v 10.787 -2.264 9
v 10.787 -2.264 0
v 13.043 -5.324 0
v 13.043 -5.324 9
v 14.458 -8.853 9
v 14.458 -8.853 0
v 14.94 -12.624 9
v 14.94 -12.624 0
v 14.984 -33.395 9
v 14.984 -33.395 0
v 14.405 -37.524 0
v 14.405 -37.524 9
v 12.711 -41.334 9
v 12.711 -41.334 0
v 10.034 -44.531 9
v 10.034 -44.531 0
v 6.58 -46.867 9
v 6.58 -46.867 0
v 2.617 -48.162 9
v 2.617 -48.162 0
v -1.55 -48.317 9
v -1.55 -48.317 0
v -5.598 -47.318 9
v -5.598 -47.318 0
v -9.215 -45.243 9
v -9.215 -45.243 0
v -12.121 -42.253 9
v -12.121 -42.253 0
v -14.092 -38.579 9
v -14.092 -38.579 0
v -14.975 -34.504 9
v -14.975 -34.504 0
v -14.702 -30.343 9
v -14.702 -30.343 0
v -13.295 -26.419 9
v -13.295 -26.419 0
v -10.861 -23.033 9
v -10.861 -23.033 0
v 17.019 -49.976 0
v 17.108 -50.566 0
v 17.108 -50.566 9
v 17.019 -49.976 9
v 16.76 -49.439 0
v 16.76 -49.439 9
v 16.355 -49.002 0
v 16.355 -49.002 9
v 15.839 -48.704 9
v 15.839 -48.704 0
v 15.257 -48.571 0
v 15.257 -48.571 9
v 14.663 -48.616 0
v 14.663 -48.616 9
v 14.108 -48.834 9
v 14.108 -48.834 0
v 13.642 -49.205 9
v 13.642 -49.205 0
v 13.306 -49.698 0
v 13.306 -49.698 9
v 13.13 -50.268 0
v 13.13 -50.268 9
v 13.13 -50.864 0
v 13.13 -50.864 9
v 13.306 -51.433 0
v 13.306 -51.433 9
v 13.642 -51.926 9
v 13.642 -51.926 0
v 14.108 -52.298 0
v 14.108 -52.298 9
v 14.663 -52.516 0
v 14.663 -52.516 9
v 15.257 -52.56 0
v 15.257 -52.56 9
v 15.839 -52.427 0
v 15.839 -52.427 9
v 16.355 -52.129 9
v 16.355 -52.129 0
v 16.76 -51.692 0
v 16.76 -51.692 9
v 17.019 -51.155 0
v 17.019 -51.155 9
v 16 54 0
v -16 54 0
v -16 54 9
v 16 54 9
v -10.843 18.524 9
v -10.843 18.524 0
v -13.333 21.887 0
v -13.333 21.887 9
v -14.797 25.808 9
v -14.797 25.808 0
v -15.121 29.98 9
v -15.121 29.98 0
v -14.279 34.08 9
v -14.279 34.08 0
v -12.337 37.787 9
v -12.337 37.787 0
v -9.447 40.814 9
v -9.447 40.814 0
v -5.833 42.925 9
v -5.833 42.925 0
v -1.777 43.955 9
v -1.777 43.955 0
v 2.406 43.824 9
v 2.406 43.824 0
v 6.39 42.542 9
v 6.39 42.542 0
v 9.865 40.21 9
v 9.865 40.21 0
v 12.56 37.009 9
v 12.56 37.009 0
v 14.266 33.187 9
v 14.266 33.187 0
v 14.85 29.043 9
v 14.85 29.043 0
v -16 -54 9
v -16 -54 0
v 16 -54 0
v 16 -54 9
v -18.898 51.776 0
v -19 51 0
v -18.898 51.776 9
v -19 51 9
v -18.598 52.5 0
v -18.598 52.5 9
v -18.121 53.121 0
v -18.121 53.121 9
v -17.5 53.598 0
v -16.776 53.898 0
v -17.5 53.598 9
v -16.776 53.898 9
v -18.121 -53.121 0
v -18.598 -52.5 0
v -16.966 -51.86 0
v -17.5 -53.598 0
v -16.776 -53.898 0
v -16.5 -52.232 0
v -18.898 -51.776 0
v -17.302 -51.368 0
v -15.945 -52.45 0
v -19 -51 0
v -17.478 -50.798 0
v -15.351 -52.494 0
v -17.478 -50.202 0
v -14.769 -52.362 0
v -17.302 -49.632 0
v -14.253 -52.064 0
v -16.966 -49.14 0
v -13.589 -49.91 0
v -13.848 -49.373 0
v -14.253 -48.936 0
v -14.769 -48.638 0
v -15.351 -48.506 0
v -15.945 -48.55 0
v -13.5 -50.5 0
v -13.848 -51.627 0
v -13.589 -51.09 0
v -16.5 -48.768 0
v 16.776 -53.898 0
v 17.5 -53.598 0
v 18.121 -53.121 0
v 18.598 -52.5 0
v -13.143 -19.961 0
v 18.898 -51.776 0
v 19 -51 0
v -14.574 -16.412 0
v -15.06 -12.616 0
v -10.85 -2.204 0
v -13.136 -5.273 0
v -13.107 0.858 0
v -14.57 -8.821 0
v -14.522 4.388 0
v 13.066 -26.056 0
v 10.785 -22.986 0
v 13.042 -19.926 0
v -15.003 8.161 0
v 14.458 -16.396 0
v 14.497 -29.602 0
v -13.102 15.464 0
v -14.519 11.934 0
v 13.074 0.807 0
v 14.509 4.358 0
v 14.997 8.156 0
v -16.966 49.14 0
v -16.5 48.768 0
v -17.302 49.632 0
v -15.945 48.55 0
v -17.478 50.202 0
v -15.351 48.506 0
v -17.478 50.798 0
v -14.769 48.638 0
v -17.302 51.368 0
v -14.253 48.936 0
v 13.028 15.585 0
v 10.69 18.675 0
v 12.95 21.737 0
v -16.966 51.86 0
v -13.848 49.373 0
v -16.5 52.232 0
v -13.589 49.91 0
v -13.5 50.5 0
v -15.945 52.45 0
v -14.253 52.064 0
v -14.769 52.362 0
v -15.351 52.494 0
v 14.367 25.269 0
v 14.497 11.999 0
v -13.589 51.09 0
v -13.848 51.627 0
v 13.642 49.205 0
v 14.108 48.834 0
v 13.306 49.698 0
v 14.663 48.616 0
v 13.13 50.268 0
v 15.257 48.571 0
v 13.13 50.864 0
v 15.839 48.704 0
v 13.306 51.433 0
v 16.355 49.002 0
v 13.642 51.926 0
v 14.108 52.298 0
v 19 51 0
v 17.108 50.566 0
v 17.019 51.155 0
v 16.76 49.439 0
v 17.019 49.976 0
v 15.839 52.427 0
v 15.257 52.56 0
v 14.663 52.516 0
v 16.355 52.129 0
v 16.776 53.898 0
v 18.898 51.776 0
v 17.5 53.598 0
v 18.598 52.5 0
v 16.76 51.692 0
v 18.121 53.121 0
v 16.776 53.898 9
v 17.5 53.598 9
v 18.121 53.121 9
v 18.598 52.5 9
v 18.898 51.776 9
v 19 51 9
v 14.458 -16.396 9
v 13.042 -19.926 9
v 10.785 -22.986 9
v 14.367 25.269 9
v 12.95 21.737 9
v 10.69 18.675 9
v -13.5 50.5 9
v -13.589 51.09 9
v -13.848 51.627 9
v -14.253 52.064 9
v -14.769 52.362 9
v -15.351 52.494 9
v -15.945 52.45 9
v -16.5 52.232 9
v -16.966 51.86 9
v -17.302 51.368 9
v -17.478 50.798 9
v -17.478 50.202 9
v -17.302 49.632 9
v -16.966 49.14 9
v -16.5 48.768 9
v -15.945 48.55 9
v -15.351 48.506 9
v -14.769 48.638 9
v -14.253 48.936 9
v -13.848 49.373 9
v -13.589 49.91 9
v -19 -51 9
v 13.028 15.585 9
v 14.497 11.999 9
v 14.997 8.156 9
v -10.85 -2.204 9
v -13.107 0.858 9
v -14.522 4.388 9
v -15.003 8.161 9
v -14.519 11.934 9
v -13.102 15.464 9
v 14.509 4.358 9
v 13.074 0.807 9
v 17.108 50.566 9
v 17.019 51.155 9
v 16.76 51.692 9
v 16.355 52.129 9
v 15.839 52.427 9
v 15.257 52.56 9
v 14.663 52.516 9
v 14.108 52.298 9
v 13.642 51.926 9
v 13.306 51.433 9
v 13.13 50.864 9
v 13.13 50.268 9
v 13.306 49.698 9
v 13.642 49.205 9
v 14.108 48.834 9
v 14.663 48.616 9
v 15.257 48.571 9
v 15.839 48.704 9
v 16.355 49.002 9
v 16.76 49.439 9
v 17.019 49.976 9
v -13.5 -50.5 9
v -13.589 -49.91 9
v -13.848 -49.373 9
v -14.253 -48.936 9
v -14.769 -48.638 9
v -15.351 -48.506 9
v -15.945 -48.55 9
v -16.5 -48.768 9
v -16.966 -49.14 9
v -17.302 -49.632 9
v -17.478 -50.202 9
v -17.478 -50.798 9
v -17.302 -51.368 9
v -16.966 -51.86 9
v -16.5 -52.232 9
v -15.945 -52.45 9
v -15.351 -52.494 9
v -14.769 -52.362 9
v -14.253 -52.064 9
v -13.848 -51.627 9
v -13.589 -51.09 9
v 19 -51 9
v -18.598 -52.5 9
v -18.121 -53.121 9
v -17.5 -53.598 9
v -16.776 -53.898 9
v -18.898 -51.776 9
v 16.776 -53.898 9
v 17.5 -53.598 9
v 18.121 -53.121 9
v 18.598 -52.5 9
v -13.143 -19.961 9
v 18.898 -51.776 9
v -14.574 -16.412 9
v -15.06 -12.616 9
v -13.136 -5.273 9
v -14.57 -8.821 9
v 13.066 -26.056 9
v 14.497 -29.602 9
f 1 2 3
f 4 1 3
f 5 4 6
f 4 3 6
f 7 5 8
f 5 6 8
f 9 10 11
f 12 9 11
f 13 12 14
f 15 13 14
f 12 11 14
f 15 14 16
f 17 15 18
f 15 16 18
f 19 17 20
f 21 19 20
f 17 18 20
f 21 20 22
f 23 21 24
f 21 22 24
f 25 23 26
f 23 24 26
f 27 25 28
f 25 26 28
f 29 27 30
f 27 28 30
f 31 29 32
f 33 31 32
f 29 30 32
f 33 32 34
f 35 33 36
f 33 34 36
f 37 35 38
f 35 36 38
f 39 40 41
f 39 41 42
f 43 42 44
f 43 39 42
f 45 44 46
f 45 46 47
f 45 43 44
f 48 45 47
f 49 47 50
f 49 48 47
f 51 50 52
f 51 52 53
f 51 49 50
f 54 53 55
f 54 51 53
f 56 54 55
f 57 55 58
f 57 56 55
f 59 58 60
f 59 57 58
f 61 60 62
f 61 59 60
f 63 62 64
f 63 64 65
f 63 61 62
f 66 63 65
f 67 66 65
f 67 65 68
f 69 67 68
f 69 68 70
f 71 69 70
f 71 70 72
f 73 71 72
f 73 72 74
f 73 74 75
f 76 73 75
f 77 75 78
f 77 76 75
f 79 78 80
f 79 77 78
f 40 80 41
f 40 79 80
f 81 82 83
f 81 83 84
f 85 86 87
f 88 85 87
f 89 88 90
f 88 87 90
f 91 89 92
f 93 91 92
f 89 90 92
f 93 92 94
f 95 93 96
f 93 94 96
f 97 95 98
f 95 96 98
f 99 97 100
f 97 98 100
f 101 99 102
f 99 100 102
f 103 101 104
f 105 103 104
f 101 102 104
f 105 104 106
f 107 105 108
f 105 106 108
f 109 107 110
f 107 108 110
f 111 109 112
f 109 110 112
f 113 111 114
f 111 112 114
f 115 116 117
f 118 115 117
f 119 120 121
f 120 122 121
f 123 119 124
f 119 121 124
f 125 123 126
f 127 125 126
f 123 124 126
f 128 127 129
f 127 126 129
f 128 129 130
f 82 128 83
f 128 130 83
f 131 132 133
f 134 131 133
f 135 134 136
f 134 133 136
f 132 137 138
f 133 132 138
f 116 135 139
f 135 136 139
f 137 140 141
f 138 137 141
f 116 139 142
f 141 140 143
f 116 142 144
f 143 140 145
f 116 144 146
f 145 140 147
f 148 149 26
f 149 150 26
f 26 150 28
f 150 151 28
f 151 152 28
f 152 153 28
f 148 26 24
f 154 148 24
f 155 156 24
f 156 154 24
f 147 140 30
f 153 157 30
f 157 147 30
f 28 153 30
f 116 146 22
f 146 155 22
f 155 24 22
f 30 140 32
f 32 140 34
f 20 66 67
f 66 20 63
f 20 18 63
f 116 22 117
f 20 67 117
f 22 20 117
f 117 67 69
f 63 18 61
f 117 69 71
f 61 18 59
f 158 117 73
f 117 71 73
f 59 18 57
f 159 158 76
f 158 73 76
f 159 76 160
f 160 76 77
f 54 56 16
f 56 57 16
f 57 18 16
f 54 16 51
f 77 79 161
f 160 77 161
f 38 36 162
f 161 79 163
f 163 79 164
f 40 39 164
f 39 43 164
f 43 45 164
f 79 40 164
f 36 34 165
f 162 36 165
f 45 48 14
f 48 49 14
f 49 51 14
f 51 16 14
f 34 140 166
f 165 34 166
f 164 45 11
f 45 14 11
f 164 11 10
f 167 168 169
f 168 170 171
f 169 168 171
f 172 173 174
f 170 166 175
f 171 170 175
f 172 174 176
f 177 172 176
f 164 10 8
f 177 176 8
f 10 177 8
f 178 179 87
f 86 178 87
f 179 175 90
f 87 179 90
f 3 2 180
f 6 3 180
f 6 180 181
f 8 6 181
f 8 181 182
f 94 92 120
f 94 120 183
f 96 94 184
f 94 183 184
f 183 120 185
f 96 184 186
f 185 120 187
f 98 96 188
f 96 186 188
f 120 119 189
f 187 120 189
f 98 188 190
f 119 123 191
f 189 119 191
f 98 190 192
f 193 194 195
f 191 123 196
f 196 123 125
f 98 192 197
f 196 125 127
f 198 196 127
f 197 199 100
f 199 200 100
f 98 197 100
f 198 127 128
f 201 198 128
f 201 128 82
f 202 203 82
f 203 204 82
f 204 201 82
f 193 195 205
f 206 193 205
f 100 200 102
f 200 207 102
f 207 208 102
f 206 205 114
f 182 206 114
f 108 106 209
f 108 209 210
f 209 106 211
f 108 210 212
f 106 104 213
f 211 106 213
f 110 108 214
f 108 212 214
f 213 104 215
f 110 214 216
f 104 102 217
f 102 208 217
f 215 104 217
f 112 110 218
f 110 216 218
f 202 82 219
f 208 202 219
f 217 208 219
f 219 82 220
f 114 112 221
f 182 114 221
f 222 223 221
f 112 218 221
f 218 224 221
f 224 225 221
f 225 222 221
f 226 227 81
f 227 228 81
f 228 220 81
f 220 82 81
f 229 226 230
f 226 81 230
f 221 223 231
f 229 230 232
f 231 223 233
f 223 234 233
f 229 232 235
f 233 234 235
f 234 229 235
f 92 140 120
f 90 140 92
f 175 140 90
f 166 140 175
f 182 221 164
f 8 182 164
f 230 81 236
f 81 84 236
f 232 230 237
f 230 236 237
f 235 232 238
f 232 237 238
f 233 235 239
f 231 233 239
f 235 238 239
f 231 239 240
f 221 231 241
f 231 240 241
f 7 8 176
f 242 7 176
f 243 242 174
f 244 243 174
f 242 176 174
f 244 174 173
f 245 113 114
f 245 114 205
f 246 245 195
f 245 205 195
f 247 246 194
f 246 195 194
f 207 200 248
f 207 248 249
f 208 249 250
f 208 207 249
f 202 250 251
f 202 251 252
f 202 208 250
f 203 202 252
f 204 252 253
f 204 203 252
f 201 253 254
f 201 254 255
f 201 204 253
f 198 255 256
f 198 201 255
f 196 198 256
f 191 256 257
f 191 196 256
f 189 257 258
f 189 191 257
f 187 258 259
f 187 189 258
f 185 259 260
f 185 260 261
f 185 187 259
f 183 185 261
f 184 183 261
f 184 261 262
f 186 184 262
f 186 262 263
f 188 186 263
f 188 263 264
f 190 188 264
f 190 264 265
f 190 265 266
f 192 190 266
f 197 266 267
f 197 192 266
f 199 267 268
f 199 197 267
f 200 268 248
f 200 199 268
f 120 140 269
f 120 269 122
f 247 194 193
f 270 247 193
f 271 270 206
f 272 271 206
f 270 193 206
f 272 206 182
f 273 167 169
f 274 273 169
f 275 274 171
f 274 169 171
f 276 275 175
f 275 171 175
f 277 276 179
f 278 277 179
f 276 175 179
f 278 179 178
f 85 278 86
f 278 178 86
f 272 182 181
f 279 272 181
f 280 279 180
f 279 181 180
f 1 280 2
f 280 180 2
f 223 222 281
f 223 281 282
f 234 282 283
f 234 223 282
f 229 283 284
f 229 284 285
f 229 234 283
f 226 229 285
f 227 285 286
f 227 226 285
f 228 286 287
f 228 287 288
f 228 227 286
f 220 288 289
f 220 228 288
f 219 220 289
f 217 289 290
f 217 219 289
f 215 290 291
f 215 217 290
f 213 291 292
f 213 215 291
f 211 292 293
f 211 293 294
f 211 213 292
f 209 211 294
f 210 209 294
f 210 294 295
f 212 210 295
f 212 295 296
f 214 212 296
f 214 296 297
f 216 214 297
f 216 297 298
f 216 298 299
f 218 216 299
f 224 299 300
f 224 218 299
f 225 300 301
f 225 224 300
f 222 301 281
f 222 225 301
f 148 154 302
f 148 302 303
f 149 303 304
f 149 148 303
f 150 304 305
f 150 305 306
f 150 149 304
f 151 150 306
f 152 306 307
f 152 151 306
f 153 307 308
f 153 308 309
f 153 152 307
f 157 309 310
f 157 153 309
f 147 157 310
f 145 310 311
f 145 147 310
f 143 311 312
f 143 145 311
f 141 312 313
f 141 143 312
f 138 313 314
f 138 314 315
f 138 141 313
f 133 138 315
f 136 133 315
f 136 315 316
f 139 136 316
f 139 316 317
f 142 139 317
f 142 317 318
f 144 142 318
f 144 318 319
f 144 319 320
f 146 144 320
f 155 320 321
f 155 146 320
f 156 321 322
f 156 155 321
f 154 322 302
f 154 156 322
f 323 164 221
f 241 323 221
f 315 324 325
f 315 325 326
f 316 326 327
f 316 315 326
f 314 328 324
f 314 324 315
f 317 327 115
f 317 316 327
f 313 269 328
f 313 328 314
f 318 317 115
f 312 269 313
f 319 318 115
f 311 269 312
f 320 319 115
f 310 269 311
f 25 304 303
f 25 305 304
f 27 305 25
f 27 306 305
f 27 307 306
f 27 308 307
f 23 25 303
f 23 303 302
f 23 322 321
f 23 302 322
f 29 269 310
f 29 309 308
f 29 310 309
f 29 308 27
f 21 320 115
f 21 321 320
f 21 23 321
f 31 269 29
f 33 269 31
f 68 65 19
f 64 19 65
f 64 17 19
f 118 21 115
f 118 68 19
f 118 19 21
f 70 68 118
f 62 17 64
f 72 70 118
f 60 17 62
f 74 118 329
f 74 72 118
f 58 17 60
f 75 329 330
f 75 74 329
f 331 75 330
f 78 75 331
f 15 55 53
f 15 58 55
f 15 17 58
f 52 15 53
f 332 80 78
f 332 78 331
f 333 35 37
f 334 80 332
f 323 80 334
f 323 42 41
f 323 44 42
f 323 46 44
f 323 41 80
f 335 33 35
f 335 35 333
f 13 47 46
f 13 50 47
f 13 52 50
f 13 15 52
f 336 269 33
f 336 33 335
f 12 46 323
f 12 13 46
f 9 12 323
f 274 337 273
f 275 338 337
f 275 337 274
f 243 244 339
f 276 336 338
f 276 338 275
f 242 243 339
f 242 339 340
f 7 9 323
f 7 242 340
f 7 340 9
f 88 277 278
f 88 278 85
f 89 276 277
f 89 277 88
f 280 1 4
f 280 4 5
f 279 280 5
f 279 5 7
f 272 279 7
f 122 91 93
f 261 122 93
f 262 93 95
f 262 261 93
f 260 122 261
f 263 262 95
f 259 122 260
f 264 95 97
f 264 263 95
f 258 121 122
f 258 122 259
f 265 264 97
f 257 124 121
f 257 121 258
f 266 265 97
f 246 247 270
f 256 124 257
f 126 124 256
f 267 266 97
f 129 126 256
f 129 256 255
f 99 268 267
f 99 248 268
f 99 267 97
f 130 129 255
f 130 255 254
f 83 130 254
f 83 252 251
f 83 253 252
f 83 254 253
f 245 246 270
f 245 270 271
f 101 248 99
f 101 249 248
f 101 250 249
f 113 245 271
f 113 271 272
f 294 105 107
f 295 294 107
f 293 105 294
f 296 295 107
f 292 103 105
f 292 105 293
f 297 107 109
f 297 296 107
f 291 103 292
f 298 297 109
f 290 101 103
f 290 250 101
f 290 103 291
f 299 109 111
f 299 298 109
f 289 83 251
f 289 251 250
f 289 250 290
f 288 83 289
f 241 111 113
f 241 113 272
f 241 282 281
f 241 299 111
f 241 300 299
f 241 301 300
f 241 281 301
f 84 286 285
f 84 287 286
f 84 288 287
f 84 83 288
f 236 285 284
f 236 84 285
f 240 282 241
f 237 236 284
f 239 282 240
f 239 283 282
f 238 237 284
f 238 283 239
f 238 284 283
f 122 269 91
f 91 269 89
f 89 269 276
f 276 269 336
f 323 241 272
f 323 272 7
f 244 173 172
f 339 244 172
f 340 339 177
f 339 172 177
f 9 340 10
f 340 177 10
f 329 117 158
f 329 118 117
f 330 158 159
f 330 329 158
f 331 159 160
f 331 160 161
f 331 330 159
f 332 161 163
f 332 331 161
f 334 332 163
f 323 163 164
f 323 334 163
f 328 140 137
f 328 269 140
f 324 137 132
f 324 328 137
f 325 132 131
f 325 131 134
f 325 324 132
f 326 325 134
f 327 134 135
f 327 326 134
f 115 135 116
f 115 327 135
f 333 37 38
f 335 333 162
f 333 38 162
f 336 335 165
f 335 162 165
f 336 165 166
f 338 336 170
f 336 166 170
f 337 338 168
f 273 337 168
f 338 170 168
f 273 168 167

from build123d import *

# Parameters (mm, degrees)
F0_W     = 38
F0_H     = 108
F0_R     = 2
F1_DEPTH = 9
F2_R     = 3


with BuildPart() as f1:
    # F0 (on Top) → F1 (new body)
    with BuildSketch(Plane.XY):
        with BuildLine():
            ThreePointArc((5.706968, -5.714822), (7.712615, -8.087528), (8.791989, -11.000826))
            ThreePointArc((8.791989, -11.000826), (11.232354, -10.554221), (12.600096, -12.624032))
            ThreePointArc((12.600096, -12.624032), (11.232354, -14.693844), (8.791989, -14.247239))
            ThreePointArc((8.791989, -14.247239), (7.713498, -17.159023), (5.709659, -19.530996))
            ThreePointArc((5.709659, -19.530996), (8.425965, -20.996255), (10.784891, -22.986424))
            ThreePointArc((10.784891, -22.986424), (13.862215, -18.206159), (14.939576, -12.624032))
            ThreePointArc((14.939576, -12.624032), (13.862843, -7.043472), (10.787222, -2.264082))
            ThreePointArc((10.787222, -2.264082), (8.425588, -4.252233), (5.706968, -5.714822))
        make_face()
        with BuildLine():
            ThreePointArc((-8.919726, -11.038862), (-7.830592, -8.082615), (-5.789315, -5.682866))
            ThreePointArc((-5.789315, -5.682866), (-8.499762, -4.205185), (-10.850307, -2.203935))
            ThreePointArc((-10.850307, -2.203935), (-15.060422, -12.616237), (-10.861132, -23.032909))
            ThreePointArc((-10.861132, -23.032909), (-8.510775, -21.032627), (-5.800788, -19.555715))
            ThreePointArc((-5.800788, -19.555715), (-7.814796, -17.19237), (-8.905782, -14.285245))
            ThreePointArc((-8.905782, -14.285245), (-12.720827, -12.678409), (-8.919726, -11.038862))
        make_face()
        with BuildLine():
            ThreePointArc((5.603682, 1.265457), (8.381963, -0.225399), (10.787222, -2.264082))
            ThreePointArc((10.787222, -2.264082), (13.905039, 2.536774), (14.997339, 8.156016))
            ThreePointArc((14.997339, 8.156016), (13.878906, 13.839509), (10.690392, 18.675455))
            ThreePointArc((10.690392, 18.675455), (8.324534, 16.666348), (5.595827, 15.187174))
            ThreePointArc((5.595827, 15.187174), (7.57988, 12.907076), (8.697198, 10.09871))
            ThreePointArc((8.697198, 10.09871), (11.379114, 10.5015), (12.850096, 8.223097))
            ThreePointArc((12.850096, 8.223097), (11.379114, 5.944693), (8.697198, 6.347483))
            ThreePointArc((8.697198, 6.347483), (7.582521, 3.543455), (5.603682, 1.265457))
        make_face()
        with BuildLine():
            ThreePointArc((-10.842957, 18.523657), (-15.00266, 8.161334), (-10.850307, -2.203935))
            ThreePointArc((-10.850307, -2.203935), (-8.49497, -0.220064), (-5.784132, 1.241002))
            ThreePointArc((-5.784132, 1.241002), (-7.772737, 3.510479), (-8.899446, 6.309695))
            ThreePointArc((-8.899446, 6.309695), (-13.060362, 8.167454), (-8.915558, 10.060887))
            ThreePointArc((-8.915558, 10.060887), (-7.810312, 12.874025), (-5.83607, 15.162624))
            ThreePointArc((-5.83607, 15.162624), (-8.510157, 16.588935), (-10.842957, 18.523657))
        make_face()
        Rectangle(F0_W, F0_H)
        with Locations((-15.5, -50.5)):
            Circle(F0_R, mode=Mode.SUBTRACT)
        with BuildLine():
            ThreePointArc((14.997339, 8.156016), (13.905039, 2.536774), (10.787222, -2.264082))
            ThreePointArc((10.787222, -2.264082), (13.862843, -7.043472), (14.939576, -12.624032))
            ThreePointArc((14.939576, -12.624032), (13.862215, -18.206159), (10.784891, -22.986424))
            ThreePointArc((10.784891, -22.986424), (13.894801, -27.783287), (14.984183, -33.3953))
            ThreePointArc((14.984183, -33.3953), (-5.597944, -47.317938), (-10.861132, -23.032909))
            ThreePointArc((-10.861132, -23.032909), (-15.060422, -12.616237), (-10.850307, -2.203935))
            ThreePointArc((-10.850307, -2.203935), (-15.00266, 8.161334), (-10.842957, 18.523657))
            ThreePointArc((-10.842957, 18.523657), (-5.833397, 42.924664), (14.850096, 29.043097))
            ThreePointArc((14.850096, 29.043097), (13.771383, 23.457599), (10.690392, 18.675455))
            ThreePointArc((10.690392, 18.675455), (13.878906, 13.839509), (14.997339, 8.156016))
        make_face(mode=Mode.SUBTRACT)
        with Locations((15.107894, -50.56573)):
            Circle(F0_R, mode=Mode.SUBTRACT)
        with Locations((-15.5, 50.5)):
            Circle(F0_R, mode=Mode.SUBTRACT)
        with Locations((15.107894, 50.56573)):
            Circle(F0_R, mode=Mode.SUBTRACT)
    extrude(amount=F1_DEPTH)

    # F2
    f2_edges = [f1.edges().sort_by_distance(p)[0] for p in [
        (19, 54, 4.5),
        (19, -54, 4.5),
        (-19, -54, 4.5),
        (-19, 54, 4.5),
    ]]
    fillet(f2_edges, radius=F2_R)


solid = f1.part
